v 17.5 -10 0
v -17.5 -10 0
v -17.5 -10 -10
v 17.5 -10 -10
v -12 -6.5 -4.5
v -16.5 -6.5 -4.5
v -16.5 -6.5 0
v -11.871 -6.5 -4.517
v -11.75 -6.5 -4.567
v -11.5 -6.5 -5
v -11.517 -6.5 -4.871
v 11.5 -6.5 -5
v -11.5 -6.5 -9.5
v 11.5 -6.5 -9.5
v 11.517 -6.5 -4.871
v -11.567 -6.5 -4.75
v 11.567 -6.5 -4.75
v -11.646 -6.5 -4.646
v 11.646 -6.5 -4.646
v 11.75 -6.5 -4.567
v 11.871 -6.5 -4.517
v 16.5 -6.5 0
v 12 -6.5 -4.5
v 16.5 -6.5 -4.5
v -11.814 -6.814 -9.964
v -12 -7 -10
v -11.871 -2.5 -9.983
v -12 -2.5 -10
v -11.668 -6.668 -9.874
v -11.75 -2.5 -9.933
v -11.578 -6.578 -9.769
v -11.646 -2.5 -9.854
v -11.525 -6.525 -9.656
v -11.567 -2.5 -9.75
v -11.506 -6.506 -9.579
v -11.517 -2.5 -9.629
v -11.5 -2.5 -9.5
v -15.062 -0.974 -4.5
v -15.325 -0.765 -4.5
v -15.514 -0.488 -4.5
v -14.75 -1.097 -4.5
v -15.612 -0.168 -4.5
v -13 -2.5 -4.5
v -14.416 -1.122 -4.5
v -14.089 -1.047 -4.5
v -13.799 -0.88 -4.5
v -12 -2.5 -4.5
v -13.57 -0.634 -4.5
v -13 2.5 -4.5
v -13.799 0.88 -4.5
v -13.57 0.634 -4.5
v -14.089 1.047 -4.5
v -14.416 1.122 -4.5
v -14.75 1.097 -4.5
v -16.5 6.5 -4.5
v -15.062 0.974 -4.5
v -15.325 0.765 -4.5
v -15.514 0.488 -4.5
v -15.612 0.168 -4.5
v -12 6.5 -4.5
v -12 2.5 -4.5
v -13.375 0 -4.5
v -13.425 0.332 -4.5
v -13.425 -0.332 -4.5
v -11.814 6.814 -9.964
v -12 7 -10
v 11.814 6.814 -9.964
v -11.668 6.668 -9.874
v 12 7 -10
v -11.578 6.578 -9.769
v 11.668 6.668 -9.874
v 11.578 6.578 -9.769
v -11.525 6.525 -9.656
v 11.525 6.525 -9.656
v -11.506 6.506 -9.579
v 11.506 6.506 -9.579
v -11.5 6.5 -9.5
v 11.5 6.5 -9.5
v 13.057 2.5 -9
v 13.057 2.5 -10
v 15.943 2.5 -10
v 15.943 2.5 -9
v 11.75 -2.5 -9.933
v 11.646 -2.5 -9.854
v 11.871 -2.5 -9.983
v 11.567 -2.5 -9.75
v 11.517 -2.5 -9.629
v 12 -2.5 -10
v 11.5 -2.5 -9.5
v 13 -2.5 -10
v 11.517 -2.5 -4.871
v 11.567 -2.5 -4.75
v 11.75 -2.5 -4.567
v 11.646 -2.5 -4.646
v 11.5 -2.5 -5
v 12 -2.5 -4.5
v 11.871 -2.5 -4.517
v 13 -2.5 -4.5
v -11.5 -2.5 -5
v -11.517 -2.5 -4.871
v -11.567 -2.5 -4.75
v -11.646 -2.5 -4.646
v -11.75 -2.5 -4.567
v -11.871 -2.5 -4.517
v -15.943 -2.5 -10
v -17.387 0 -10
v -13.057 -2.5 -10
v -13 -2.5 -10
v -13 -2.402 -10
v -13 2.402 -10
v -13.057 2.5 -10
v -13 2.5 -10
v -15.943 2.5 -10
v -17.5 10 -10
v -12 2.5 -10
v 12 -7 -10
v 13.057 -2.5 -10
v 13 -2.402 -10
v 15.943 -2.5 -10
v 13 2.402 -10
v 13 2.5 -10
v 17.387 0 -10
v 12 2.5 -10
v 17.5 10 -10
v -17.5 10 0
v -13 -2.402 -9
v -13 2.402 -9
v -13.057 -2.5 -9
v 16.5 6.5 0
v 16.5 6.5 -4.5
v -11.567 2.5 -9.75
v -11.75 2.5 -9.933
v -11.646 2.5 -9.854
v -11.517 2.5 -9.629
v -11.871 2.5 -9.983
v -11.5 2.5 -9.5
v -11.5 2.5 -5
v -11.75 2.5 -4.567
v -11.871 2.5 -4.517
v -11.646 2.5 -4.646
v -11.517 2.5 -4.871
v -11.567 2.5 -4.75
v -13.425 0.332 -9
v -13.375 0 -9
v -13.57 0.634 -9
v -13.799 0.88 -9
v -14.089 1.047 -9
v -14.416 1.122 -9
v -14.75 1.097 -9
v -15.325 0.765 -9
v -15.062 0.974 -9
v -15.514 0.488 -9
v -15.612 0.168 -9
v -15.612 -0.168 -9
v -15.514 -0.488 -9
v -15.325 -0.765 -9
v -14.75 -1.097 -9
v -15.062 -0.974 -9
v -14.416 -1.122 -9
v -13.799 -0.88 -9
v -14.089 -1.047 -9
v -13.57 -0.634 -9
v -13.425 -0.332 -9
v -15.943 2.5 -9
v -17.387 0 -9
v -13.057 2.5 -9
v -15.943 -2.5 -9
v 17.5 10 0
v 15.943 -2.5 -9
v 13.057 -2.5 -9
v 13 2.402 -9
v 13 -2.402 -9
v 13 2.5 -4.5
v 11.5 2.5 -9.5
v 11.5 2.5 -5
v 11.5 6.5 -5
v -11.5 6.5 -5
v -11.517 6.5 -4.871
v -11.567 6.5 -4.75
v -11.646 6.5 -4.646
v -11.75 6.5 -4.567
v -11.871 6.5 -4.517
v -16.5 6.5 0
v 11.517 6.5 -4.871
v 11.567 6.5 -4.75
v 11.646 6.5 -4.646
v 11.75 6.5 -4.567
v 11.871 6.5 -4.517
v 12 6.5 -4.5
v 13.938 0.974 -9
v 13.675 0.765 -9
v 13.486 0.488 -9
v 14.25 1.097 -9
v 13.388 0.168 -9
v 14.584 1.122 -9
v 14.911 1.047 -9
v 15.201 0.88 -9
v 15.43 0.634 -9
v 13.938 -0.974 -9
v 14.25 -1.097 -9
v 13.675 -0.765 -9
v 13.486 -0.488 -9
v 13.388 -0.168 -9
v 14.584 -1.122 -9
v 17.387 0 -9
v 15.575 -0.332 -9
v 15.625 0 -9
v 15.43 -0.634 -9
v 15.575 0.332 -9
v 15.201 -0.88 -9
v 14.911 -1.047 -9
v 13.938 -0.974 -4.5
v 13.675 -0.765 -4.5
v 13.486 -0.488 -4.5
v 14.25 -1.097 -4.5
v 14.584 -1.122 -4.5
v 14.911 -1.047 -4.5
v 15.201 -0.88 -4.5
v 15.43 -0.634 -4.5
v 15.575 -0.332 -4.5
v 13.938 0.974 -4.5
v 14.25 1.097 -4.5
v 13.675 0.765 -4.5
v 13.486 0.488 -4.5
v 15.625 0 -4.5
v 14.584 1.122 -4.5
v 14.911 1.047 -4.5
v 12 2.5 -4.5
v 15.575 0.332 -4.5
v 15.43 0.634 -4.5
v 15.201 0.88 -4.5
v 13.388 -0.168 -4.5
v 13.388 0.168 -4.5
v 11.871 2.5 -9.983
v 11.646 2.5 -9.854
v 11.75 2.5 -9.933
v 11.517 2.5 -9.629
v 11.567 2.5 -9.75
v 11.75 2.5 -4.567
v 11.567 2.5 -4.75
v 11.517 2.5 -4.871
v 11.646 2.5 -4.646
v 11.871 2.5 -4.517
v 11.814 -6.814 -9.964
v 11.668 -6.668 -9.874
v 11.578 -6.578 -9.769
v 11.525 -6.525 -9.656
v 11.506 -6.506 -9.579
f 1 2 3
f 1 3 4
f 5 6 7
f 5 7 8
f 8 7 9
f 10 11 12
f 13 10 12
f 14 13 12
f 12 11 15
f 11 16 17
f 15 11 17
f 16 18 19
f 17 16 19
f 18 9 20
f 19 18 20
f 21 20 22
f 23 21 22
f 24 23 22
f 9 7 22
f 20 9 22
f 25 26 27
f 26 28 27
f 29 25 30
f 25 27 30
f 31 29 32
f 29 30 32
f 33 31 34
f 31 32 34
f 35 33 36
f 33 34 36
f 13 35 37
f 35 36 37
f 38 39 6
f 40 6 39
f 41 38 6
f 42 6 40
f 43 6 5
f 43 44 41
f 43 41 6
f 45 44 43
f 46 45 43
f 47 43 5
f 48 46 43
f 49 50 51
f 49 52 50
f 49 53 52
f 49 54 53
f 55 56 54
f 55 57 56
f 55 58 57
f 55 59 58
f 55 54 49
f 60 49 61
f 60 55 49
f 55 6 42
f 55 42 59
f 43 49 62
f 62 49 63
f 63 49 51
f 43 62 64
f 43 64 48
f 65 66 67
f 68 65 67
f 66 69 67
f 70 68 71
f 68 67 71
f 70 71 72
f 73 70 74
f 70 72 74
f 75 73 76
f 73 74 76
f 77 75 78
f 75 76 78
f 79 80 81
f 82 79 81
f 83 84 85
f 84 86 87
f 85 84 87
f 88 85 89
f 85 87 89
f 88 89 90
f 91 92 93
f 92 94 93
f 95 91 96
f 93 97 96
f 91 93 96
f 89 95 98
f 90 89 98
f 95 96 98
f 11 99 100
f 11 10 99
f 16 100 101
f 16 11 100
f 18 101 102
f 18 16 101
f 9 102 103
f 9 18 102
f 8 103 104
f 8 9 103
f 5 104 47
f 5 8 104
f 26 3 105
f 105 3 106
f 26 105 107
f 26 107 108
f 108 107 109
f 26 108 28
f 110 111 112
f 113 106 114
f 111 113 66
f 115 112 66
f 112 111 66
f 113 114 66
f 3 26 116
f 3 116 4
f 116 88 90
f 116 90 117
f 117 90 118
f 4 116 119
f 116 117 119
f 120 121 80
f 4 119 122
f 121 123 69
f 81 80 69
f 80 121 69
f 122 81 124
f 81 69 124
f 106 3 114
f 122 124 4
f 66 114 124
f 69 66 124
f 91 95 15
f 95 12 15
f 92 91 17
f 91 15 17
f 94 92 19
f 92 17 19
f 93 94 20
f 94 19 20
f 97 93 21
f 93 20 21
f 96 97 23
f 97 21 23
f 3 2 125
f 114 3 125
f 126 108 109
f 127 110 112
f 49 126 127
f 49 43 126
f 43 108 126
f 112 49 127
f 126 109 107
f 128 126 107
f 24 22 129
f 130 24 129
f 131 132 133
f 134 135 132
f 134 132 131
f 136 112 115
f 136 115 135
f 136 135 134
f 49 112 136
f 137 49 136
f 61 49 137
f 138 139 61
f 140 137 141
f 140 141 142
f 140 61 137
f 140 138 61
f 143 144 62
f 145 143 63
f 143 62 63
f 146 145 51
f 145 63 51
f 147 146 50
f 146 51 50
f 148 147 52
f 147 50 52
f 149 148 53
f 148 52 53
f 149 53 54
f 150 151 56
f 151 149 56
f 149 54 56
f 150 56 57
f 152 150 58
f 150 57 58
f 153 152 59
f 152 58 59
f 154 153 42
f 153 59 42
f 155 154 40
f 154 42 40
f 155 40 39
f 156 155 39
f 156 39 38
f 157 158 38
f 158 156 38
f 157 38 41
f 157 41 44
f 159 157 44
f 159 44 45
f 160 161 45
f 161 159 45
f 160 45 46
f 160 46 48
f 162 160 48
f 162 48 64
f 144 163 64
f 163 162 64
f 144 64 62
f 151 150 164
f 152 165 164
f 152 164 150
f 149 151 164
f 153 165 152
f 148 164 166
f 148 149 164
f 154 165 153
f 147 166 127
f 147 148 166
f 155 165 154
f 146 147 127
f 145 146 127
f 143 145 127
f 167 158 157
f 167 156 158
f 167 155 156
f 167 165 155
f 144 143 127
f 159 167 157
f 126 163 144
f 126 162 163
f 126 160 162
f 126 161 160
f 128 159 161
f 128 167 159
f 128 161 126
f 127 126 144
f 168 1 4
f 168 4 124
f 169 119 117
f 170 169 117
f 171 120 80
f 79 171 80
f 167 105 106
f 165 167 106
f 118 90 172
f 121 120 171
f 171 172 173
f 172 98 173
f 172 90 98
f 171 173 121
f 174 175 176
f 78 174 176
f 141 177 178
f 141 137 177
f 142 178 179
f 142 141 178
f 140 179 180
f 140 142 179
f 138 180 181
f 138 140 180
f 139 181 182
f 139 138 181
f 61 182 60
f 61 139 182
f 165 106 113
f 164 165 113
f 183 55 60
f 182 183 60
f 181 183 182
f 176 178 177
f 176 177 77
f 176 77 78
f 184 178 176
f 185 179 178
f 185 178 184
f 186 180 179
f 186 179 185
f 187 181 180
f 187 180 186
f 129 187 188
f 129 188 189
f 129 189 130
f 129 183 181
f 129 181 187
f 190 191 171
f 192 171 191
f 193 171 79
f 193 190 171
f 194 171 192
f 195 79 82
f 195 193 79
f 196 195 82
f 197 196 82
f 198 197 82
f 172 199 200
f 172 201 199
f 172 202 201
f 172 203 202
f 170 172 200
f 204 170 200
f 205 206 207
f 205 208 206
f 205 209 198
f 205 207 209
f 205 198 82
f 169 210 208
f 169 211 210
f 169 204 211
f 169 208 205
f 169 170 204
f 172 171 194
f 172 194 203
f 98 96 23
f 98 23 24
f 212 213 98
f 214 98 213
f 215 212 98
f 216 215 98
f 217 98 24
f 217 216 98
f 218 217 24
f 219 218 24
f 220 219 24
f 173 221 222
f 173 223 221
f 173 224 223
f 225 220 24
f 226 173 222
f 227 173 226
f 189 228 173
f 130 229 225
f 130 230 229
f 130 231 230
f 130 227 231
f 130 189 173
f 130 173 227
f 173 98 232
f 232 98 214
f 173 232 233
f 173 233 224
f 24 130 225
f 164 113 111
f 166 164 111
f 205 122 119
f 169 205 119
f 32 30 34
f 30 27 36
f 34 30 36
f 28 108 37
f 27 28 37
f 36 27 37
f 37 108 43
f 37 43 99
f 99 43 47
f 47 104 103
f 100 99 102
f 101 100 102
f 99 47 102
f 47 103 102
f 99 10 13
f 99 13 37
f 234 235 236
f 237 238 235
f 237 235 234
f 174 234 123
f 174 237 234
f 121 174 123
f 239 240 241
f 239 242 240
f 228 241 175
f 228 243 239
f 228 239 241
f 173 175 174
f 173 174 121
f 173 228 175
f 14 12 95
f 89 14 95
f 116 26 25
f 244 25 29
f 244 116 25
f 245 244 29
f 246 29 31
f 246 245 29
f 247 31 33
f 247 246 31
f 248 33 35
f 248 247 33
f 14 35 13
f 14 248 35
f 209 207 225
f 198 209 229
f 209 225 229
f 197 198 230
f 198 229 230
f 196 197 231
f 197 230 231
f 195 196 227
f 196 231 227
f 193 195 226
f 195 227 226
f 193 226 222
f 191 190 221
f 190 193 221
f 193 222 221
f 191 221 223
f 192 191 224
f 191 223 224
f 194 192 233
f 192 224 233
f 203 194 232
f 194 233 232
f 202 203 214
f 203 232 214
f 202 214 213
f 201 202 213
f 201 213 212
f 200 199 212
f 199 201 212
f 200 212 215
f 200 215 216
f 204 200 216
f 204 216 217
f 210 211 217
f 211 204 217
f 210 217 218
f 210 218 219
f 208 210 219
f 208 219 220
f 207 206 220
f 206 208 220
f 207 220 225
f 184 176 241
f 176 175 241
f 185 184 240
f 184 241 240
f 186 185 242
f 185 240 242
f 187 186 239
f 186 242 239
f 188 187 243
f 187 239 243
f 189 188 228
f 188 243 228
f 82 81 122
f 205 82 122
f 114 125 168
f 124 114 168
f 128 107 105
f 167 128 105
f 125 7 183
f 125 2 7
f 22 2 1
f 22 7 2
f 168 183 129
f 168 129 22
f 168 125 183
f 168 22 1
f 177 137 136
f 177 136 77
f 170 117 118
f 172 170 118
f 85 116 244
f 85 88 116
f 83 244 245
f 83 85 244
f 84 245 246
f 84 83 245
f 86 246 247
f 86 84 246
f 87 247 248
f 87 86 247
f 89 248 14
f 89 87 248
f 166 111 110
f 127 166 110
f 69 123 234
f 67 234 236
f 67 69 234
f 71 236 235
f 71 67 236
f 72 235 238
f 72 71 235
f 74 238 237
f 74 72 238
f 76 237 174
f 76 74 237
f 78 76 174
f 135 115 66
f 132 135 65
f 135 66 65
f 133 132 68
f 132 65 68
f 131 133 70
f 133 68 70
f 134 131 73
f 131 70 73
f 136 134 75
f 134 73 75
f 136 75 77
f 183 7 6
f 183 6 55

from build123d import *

# Parameters (mm, degrees)
F0_W     = 35
F0_H     = 20
F1_DEPTH = 10
F2_W     = 23
F2_H     = 13
F3_DEPTH = 10
F4_W     = 33
F4_H     = 13
F5_DEPTH = 4.5
F6_R     = 1.125
F6_W     = 1.5
F6_H     = 5
F7_DEPTH = 5.5
F8_R     = 1.125
F9_DEPTH = 1
F10_R    = 0.5


with BuildPart() as f1:
    # F0 (on Top) → F1 (new body)
    with BuildSketch(Plane.XY):
        Rectangle(F0_W, F0_H)
    extrude(amount=-F1_DEPTH)

    # F2 (on Top) → F3 (cut, through all)
    with BuildSketch(Plane.XY):
        Rectangle(F2_W, F2_H)
    extrude(amount=-F3_DEPTH, mode=Mode.SUBTRACT)

    # F4 (on Top) → F5 (cut)
    with BuildSketch(Plane.XY):
        Rectangle(F4_W, F4_H)
    extrude(amount=-F5_DEPTH, mode=Mode.SUBTRACT)

    # F6 (on face) → F7 (cut, through all)
    with BuildSketch(Plane.XY.offset(-4.5)):
        with Locations((-14.5, 0)):
            Circle(F6_R)
        with Locations((14.5, 0)):
            Circle(F6_R)
        with Locations((-12.25, 0)):
            Rectangle(F6_W, F6_H)
        with Locations((12.25, 0)):
            Rectangle(F6_W, F6_H)
    extrude(amount=-F7_DEPTH, mode=Mode.SUBTRACT)

    # F8 (on face) → F9 (cut)
    with BuildSketch(Plane(origin=(0, 0, -10), x_dir=(1, 0, 0), z_dir=(0, 0, -1))):
        Polygon((-15.943375673, -2.5), (-13.056624327, -2.5), (-13, -2.4019237886), (-13, 2.4019237886), (-13.056624327, 2.5), (-15.943375673, 2.5), (-17.3867513459, 0), align=None)
        with Locations((-14.5, 0)):
            Circle(F8_R, mode=Mode.SUBTRACT)
        Polygon((13, 2.4019237886), (13, -2.4019237886), (13.056624327, -2.5), (15.943375673, -2.5), (17.3867513459, 0), (15.943375673, 2.5), (13.056624327, 2.5), align=None)
        with Locations((14.5, 0)):
            Circle(F8_R, mode=Mode.SUBTRACT)
    extrude(amount=-F9_DEPTH, mode=Mode.SUBTRACT)

    # F10
    f10_edges = [f1.edges().sort_by_distance(p)[0] for p in [
        (-11.5, 4.5, -10),
        (-11.5, -4.5, -10),
        (0, -6.5, -10),
        (0, 6.5, -10),
        (11.5, 4.5, -10),
        (11.5, -4.5, -10),
        (11.5, -4.5, -4.5),
        (11.5, 4.5, -4.5),
        (-11.5, -4.5, -4.5),
        (-11.5, 4.5, -4.5),
    ]]
    fillet(f10_edges, radius=F10_R)


solid = f1.part
